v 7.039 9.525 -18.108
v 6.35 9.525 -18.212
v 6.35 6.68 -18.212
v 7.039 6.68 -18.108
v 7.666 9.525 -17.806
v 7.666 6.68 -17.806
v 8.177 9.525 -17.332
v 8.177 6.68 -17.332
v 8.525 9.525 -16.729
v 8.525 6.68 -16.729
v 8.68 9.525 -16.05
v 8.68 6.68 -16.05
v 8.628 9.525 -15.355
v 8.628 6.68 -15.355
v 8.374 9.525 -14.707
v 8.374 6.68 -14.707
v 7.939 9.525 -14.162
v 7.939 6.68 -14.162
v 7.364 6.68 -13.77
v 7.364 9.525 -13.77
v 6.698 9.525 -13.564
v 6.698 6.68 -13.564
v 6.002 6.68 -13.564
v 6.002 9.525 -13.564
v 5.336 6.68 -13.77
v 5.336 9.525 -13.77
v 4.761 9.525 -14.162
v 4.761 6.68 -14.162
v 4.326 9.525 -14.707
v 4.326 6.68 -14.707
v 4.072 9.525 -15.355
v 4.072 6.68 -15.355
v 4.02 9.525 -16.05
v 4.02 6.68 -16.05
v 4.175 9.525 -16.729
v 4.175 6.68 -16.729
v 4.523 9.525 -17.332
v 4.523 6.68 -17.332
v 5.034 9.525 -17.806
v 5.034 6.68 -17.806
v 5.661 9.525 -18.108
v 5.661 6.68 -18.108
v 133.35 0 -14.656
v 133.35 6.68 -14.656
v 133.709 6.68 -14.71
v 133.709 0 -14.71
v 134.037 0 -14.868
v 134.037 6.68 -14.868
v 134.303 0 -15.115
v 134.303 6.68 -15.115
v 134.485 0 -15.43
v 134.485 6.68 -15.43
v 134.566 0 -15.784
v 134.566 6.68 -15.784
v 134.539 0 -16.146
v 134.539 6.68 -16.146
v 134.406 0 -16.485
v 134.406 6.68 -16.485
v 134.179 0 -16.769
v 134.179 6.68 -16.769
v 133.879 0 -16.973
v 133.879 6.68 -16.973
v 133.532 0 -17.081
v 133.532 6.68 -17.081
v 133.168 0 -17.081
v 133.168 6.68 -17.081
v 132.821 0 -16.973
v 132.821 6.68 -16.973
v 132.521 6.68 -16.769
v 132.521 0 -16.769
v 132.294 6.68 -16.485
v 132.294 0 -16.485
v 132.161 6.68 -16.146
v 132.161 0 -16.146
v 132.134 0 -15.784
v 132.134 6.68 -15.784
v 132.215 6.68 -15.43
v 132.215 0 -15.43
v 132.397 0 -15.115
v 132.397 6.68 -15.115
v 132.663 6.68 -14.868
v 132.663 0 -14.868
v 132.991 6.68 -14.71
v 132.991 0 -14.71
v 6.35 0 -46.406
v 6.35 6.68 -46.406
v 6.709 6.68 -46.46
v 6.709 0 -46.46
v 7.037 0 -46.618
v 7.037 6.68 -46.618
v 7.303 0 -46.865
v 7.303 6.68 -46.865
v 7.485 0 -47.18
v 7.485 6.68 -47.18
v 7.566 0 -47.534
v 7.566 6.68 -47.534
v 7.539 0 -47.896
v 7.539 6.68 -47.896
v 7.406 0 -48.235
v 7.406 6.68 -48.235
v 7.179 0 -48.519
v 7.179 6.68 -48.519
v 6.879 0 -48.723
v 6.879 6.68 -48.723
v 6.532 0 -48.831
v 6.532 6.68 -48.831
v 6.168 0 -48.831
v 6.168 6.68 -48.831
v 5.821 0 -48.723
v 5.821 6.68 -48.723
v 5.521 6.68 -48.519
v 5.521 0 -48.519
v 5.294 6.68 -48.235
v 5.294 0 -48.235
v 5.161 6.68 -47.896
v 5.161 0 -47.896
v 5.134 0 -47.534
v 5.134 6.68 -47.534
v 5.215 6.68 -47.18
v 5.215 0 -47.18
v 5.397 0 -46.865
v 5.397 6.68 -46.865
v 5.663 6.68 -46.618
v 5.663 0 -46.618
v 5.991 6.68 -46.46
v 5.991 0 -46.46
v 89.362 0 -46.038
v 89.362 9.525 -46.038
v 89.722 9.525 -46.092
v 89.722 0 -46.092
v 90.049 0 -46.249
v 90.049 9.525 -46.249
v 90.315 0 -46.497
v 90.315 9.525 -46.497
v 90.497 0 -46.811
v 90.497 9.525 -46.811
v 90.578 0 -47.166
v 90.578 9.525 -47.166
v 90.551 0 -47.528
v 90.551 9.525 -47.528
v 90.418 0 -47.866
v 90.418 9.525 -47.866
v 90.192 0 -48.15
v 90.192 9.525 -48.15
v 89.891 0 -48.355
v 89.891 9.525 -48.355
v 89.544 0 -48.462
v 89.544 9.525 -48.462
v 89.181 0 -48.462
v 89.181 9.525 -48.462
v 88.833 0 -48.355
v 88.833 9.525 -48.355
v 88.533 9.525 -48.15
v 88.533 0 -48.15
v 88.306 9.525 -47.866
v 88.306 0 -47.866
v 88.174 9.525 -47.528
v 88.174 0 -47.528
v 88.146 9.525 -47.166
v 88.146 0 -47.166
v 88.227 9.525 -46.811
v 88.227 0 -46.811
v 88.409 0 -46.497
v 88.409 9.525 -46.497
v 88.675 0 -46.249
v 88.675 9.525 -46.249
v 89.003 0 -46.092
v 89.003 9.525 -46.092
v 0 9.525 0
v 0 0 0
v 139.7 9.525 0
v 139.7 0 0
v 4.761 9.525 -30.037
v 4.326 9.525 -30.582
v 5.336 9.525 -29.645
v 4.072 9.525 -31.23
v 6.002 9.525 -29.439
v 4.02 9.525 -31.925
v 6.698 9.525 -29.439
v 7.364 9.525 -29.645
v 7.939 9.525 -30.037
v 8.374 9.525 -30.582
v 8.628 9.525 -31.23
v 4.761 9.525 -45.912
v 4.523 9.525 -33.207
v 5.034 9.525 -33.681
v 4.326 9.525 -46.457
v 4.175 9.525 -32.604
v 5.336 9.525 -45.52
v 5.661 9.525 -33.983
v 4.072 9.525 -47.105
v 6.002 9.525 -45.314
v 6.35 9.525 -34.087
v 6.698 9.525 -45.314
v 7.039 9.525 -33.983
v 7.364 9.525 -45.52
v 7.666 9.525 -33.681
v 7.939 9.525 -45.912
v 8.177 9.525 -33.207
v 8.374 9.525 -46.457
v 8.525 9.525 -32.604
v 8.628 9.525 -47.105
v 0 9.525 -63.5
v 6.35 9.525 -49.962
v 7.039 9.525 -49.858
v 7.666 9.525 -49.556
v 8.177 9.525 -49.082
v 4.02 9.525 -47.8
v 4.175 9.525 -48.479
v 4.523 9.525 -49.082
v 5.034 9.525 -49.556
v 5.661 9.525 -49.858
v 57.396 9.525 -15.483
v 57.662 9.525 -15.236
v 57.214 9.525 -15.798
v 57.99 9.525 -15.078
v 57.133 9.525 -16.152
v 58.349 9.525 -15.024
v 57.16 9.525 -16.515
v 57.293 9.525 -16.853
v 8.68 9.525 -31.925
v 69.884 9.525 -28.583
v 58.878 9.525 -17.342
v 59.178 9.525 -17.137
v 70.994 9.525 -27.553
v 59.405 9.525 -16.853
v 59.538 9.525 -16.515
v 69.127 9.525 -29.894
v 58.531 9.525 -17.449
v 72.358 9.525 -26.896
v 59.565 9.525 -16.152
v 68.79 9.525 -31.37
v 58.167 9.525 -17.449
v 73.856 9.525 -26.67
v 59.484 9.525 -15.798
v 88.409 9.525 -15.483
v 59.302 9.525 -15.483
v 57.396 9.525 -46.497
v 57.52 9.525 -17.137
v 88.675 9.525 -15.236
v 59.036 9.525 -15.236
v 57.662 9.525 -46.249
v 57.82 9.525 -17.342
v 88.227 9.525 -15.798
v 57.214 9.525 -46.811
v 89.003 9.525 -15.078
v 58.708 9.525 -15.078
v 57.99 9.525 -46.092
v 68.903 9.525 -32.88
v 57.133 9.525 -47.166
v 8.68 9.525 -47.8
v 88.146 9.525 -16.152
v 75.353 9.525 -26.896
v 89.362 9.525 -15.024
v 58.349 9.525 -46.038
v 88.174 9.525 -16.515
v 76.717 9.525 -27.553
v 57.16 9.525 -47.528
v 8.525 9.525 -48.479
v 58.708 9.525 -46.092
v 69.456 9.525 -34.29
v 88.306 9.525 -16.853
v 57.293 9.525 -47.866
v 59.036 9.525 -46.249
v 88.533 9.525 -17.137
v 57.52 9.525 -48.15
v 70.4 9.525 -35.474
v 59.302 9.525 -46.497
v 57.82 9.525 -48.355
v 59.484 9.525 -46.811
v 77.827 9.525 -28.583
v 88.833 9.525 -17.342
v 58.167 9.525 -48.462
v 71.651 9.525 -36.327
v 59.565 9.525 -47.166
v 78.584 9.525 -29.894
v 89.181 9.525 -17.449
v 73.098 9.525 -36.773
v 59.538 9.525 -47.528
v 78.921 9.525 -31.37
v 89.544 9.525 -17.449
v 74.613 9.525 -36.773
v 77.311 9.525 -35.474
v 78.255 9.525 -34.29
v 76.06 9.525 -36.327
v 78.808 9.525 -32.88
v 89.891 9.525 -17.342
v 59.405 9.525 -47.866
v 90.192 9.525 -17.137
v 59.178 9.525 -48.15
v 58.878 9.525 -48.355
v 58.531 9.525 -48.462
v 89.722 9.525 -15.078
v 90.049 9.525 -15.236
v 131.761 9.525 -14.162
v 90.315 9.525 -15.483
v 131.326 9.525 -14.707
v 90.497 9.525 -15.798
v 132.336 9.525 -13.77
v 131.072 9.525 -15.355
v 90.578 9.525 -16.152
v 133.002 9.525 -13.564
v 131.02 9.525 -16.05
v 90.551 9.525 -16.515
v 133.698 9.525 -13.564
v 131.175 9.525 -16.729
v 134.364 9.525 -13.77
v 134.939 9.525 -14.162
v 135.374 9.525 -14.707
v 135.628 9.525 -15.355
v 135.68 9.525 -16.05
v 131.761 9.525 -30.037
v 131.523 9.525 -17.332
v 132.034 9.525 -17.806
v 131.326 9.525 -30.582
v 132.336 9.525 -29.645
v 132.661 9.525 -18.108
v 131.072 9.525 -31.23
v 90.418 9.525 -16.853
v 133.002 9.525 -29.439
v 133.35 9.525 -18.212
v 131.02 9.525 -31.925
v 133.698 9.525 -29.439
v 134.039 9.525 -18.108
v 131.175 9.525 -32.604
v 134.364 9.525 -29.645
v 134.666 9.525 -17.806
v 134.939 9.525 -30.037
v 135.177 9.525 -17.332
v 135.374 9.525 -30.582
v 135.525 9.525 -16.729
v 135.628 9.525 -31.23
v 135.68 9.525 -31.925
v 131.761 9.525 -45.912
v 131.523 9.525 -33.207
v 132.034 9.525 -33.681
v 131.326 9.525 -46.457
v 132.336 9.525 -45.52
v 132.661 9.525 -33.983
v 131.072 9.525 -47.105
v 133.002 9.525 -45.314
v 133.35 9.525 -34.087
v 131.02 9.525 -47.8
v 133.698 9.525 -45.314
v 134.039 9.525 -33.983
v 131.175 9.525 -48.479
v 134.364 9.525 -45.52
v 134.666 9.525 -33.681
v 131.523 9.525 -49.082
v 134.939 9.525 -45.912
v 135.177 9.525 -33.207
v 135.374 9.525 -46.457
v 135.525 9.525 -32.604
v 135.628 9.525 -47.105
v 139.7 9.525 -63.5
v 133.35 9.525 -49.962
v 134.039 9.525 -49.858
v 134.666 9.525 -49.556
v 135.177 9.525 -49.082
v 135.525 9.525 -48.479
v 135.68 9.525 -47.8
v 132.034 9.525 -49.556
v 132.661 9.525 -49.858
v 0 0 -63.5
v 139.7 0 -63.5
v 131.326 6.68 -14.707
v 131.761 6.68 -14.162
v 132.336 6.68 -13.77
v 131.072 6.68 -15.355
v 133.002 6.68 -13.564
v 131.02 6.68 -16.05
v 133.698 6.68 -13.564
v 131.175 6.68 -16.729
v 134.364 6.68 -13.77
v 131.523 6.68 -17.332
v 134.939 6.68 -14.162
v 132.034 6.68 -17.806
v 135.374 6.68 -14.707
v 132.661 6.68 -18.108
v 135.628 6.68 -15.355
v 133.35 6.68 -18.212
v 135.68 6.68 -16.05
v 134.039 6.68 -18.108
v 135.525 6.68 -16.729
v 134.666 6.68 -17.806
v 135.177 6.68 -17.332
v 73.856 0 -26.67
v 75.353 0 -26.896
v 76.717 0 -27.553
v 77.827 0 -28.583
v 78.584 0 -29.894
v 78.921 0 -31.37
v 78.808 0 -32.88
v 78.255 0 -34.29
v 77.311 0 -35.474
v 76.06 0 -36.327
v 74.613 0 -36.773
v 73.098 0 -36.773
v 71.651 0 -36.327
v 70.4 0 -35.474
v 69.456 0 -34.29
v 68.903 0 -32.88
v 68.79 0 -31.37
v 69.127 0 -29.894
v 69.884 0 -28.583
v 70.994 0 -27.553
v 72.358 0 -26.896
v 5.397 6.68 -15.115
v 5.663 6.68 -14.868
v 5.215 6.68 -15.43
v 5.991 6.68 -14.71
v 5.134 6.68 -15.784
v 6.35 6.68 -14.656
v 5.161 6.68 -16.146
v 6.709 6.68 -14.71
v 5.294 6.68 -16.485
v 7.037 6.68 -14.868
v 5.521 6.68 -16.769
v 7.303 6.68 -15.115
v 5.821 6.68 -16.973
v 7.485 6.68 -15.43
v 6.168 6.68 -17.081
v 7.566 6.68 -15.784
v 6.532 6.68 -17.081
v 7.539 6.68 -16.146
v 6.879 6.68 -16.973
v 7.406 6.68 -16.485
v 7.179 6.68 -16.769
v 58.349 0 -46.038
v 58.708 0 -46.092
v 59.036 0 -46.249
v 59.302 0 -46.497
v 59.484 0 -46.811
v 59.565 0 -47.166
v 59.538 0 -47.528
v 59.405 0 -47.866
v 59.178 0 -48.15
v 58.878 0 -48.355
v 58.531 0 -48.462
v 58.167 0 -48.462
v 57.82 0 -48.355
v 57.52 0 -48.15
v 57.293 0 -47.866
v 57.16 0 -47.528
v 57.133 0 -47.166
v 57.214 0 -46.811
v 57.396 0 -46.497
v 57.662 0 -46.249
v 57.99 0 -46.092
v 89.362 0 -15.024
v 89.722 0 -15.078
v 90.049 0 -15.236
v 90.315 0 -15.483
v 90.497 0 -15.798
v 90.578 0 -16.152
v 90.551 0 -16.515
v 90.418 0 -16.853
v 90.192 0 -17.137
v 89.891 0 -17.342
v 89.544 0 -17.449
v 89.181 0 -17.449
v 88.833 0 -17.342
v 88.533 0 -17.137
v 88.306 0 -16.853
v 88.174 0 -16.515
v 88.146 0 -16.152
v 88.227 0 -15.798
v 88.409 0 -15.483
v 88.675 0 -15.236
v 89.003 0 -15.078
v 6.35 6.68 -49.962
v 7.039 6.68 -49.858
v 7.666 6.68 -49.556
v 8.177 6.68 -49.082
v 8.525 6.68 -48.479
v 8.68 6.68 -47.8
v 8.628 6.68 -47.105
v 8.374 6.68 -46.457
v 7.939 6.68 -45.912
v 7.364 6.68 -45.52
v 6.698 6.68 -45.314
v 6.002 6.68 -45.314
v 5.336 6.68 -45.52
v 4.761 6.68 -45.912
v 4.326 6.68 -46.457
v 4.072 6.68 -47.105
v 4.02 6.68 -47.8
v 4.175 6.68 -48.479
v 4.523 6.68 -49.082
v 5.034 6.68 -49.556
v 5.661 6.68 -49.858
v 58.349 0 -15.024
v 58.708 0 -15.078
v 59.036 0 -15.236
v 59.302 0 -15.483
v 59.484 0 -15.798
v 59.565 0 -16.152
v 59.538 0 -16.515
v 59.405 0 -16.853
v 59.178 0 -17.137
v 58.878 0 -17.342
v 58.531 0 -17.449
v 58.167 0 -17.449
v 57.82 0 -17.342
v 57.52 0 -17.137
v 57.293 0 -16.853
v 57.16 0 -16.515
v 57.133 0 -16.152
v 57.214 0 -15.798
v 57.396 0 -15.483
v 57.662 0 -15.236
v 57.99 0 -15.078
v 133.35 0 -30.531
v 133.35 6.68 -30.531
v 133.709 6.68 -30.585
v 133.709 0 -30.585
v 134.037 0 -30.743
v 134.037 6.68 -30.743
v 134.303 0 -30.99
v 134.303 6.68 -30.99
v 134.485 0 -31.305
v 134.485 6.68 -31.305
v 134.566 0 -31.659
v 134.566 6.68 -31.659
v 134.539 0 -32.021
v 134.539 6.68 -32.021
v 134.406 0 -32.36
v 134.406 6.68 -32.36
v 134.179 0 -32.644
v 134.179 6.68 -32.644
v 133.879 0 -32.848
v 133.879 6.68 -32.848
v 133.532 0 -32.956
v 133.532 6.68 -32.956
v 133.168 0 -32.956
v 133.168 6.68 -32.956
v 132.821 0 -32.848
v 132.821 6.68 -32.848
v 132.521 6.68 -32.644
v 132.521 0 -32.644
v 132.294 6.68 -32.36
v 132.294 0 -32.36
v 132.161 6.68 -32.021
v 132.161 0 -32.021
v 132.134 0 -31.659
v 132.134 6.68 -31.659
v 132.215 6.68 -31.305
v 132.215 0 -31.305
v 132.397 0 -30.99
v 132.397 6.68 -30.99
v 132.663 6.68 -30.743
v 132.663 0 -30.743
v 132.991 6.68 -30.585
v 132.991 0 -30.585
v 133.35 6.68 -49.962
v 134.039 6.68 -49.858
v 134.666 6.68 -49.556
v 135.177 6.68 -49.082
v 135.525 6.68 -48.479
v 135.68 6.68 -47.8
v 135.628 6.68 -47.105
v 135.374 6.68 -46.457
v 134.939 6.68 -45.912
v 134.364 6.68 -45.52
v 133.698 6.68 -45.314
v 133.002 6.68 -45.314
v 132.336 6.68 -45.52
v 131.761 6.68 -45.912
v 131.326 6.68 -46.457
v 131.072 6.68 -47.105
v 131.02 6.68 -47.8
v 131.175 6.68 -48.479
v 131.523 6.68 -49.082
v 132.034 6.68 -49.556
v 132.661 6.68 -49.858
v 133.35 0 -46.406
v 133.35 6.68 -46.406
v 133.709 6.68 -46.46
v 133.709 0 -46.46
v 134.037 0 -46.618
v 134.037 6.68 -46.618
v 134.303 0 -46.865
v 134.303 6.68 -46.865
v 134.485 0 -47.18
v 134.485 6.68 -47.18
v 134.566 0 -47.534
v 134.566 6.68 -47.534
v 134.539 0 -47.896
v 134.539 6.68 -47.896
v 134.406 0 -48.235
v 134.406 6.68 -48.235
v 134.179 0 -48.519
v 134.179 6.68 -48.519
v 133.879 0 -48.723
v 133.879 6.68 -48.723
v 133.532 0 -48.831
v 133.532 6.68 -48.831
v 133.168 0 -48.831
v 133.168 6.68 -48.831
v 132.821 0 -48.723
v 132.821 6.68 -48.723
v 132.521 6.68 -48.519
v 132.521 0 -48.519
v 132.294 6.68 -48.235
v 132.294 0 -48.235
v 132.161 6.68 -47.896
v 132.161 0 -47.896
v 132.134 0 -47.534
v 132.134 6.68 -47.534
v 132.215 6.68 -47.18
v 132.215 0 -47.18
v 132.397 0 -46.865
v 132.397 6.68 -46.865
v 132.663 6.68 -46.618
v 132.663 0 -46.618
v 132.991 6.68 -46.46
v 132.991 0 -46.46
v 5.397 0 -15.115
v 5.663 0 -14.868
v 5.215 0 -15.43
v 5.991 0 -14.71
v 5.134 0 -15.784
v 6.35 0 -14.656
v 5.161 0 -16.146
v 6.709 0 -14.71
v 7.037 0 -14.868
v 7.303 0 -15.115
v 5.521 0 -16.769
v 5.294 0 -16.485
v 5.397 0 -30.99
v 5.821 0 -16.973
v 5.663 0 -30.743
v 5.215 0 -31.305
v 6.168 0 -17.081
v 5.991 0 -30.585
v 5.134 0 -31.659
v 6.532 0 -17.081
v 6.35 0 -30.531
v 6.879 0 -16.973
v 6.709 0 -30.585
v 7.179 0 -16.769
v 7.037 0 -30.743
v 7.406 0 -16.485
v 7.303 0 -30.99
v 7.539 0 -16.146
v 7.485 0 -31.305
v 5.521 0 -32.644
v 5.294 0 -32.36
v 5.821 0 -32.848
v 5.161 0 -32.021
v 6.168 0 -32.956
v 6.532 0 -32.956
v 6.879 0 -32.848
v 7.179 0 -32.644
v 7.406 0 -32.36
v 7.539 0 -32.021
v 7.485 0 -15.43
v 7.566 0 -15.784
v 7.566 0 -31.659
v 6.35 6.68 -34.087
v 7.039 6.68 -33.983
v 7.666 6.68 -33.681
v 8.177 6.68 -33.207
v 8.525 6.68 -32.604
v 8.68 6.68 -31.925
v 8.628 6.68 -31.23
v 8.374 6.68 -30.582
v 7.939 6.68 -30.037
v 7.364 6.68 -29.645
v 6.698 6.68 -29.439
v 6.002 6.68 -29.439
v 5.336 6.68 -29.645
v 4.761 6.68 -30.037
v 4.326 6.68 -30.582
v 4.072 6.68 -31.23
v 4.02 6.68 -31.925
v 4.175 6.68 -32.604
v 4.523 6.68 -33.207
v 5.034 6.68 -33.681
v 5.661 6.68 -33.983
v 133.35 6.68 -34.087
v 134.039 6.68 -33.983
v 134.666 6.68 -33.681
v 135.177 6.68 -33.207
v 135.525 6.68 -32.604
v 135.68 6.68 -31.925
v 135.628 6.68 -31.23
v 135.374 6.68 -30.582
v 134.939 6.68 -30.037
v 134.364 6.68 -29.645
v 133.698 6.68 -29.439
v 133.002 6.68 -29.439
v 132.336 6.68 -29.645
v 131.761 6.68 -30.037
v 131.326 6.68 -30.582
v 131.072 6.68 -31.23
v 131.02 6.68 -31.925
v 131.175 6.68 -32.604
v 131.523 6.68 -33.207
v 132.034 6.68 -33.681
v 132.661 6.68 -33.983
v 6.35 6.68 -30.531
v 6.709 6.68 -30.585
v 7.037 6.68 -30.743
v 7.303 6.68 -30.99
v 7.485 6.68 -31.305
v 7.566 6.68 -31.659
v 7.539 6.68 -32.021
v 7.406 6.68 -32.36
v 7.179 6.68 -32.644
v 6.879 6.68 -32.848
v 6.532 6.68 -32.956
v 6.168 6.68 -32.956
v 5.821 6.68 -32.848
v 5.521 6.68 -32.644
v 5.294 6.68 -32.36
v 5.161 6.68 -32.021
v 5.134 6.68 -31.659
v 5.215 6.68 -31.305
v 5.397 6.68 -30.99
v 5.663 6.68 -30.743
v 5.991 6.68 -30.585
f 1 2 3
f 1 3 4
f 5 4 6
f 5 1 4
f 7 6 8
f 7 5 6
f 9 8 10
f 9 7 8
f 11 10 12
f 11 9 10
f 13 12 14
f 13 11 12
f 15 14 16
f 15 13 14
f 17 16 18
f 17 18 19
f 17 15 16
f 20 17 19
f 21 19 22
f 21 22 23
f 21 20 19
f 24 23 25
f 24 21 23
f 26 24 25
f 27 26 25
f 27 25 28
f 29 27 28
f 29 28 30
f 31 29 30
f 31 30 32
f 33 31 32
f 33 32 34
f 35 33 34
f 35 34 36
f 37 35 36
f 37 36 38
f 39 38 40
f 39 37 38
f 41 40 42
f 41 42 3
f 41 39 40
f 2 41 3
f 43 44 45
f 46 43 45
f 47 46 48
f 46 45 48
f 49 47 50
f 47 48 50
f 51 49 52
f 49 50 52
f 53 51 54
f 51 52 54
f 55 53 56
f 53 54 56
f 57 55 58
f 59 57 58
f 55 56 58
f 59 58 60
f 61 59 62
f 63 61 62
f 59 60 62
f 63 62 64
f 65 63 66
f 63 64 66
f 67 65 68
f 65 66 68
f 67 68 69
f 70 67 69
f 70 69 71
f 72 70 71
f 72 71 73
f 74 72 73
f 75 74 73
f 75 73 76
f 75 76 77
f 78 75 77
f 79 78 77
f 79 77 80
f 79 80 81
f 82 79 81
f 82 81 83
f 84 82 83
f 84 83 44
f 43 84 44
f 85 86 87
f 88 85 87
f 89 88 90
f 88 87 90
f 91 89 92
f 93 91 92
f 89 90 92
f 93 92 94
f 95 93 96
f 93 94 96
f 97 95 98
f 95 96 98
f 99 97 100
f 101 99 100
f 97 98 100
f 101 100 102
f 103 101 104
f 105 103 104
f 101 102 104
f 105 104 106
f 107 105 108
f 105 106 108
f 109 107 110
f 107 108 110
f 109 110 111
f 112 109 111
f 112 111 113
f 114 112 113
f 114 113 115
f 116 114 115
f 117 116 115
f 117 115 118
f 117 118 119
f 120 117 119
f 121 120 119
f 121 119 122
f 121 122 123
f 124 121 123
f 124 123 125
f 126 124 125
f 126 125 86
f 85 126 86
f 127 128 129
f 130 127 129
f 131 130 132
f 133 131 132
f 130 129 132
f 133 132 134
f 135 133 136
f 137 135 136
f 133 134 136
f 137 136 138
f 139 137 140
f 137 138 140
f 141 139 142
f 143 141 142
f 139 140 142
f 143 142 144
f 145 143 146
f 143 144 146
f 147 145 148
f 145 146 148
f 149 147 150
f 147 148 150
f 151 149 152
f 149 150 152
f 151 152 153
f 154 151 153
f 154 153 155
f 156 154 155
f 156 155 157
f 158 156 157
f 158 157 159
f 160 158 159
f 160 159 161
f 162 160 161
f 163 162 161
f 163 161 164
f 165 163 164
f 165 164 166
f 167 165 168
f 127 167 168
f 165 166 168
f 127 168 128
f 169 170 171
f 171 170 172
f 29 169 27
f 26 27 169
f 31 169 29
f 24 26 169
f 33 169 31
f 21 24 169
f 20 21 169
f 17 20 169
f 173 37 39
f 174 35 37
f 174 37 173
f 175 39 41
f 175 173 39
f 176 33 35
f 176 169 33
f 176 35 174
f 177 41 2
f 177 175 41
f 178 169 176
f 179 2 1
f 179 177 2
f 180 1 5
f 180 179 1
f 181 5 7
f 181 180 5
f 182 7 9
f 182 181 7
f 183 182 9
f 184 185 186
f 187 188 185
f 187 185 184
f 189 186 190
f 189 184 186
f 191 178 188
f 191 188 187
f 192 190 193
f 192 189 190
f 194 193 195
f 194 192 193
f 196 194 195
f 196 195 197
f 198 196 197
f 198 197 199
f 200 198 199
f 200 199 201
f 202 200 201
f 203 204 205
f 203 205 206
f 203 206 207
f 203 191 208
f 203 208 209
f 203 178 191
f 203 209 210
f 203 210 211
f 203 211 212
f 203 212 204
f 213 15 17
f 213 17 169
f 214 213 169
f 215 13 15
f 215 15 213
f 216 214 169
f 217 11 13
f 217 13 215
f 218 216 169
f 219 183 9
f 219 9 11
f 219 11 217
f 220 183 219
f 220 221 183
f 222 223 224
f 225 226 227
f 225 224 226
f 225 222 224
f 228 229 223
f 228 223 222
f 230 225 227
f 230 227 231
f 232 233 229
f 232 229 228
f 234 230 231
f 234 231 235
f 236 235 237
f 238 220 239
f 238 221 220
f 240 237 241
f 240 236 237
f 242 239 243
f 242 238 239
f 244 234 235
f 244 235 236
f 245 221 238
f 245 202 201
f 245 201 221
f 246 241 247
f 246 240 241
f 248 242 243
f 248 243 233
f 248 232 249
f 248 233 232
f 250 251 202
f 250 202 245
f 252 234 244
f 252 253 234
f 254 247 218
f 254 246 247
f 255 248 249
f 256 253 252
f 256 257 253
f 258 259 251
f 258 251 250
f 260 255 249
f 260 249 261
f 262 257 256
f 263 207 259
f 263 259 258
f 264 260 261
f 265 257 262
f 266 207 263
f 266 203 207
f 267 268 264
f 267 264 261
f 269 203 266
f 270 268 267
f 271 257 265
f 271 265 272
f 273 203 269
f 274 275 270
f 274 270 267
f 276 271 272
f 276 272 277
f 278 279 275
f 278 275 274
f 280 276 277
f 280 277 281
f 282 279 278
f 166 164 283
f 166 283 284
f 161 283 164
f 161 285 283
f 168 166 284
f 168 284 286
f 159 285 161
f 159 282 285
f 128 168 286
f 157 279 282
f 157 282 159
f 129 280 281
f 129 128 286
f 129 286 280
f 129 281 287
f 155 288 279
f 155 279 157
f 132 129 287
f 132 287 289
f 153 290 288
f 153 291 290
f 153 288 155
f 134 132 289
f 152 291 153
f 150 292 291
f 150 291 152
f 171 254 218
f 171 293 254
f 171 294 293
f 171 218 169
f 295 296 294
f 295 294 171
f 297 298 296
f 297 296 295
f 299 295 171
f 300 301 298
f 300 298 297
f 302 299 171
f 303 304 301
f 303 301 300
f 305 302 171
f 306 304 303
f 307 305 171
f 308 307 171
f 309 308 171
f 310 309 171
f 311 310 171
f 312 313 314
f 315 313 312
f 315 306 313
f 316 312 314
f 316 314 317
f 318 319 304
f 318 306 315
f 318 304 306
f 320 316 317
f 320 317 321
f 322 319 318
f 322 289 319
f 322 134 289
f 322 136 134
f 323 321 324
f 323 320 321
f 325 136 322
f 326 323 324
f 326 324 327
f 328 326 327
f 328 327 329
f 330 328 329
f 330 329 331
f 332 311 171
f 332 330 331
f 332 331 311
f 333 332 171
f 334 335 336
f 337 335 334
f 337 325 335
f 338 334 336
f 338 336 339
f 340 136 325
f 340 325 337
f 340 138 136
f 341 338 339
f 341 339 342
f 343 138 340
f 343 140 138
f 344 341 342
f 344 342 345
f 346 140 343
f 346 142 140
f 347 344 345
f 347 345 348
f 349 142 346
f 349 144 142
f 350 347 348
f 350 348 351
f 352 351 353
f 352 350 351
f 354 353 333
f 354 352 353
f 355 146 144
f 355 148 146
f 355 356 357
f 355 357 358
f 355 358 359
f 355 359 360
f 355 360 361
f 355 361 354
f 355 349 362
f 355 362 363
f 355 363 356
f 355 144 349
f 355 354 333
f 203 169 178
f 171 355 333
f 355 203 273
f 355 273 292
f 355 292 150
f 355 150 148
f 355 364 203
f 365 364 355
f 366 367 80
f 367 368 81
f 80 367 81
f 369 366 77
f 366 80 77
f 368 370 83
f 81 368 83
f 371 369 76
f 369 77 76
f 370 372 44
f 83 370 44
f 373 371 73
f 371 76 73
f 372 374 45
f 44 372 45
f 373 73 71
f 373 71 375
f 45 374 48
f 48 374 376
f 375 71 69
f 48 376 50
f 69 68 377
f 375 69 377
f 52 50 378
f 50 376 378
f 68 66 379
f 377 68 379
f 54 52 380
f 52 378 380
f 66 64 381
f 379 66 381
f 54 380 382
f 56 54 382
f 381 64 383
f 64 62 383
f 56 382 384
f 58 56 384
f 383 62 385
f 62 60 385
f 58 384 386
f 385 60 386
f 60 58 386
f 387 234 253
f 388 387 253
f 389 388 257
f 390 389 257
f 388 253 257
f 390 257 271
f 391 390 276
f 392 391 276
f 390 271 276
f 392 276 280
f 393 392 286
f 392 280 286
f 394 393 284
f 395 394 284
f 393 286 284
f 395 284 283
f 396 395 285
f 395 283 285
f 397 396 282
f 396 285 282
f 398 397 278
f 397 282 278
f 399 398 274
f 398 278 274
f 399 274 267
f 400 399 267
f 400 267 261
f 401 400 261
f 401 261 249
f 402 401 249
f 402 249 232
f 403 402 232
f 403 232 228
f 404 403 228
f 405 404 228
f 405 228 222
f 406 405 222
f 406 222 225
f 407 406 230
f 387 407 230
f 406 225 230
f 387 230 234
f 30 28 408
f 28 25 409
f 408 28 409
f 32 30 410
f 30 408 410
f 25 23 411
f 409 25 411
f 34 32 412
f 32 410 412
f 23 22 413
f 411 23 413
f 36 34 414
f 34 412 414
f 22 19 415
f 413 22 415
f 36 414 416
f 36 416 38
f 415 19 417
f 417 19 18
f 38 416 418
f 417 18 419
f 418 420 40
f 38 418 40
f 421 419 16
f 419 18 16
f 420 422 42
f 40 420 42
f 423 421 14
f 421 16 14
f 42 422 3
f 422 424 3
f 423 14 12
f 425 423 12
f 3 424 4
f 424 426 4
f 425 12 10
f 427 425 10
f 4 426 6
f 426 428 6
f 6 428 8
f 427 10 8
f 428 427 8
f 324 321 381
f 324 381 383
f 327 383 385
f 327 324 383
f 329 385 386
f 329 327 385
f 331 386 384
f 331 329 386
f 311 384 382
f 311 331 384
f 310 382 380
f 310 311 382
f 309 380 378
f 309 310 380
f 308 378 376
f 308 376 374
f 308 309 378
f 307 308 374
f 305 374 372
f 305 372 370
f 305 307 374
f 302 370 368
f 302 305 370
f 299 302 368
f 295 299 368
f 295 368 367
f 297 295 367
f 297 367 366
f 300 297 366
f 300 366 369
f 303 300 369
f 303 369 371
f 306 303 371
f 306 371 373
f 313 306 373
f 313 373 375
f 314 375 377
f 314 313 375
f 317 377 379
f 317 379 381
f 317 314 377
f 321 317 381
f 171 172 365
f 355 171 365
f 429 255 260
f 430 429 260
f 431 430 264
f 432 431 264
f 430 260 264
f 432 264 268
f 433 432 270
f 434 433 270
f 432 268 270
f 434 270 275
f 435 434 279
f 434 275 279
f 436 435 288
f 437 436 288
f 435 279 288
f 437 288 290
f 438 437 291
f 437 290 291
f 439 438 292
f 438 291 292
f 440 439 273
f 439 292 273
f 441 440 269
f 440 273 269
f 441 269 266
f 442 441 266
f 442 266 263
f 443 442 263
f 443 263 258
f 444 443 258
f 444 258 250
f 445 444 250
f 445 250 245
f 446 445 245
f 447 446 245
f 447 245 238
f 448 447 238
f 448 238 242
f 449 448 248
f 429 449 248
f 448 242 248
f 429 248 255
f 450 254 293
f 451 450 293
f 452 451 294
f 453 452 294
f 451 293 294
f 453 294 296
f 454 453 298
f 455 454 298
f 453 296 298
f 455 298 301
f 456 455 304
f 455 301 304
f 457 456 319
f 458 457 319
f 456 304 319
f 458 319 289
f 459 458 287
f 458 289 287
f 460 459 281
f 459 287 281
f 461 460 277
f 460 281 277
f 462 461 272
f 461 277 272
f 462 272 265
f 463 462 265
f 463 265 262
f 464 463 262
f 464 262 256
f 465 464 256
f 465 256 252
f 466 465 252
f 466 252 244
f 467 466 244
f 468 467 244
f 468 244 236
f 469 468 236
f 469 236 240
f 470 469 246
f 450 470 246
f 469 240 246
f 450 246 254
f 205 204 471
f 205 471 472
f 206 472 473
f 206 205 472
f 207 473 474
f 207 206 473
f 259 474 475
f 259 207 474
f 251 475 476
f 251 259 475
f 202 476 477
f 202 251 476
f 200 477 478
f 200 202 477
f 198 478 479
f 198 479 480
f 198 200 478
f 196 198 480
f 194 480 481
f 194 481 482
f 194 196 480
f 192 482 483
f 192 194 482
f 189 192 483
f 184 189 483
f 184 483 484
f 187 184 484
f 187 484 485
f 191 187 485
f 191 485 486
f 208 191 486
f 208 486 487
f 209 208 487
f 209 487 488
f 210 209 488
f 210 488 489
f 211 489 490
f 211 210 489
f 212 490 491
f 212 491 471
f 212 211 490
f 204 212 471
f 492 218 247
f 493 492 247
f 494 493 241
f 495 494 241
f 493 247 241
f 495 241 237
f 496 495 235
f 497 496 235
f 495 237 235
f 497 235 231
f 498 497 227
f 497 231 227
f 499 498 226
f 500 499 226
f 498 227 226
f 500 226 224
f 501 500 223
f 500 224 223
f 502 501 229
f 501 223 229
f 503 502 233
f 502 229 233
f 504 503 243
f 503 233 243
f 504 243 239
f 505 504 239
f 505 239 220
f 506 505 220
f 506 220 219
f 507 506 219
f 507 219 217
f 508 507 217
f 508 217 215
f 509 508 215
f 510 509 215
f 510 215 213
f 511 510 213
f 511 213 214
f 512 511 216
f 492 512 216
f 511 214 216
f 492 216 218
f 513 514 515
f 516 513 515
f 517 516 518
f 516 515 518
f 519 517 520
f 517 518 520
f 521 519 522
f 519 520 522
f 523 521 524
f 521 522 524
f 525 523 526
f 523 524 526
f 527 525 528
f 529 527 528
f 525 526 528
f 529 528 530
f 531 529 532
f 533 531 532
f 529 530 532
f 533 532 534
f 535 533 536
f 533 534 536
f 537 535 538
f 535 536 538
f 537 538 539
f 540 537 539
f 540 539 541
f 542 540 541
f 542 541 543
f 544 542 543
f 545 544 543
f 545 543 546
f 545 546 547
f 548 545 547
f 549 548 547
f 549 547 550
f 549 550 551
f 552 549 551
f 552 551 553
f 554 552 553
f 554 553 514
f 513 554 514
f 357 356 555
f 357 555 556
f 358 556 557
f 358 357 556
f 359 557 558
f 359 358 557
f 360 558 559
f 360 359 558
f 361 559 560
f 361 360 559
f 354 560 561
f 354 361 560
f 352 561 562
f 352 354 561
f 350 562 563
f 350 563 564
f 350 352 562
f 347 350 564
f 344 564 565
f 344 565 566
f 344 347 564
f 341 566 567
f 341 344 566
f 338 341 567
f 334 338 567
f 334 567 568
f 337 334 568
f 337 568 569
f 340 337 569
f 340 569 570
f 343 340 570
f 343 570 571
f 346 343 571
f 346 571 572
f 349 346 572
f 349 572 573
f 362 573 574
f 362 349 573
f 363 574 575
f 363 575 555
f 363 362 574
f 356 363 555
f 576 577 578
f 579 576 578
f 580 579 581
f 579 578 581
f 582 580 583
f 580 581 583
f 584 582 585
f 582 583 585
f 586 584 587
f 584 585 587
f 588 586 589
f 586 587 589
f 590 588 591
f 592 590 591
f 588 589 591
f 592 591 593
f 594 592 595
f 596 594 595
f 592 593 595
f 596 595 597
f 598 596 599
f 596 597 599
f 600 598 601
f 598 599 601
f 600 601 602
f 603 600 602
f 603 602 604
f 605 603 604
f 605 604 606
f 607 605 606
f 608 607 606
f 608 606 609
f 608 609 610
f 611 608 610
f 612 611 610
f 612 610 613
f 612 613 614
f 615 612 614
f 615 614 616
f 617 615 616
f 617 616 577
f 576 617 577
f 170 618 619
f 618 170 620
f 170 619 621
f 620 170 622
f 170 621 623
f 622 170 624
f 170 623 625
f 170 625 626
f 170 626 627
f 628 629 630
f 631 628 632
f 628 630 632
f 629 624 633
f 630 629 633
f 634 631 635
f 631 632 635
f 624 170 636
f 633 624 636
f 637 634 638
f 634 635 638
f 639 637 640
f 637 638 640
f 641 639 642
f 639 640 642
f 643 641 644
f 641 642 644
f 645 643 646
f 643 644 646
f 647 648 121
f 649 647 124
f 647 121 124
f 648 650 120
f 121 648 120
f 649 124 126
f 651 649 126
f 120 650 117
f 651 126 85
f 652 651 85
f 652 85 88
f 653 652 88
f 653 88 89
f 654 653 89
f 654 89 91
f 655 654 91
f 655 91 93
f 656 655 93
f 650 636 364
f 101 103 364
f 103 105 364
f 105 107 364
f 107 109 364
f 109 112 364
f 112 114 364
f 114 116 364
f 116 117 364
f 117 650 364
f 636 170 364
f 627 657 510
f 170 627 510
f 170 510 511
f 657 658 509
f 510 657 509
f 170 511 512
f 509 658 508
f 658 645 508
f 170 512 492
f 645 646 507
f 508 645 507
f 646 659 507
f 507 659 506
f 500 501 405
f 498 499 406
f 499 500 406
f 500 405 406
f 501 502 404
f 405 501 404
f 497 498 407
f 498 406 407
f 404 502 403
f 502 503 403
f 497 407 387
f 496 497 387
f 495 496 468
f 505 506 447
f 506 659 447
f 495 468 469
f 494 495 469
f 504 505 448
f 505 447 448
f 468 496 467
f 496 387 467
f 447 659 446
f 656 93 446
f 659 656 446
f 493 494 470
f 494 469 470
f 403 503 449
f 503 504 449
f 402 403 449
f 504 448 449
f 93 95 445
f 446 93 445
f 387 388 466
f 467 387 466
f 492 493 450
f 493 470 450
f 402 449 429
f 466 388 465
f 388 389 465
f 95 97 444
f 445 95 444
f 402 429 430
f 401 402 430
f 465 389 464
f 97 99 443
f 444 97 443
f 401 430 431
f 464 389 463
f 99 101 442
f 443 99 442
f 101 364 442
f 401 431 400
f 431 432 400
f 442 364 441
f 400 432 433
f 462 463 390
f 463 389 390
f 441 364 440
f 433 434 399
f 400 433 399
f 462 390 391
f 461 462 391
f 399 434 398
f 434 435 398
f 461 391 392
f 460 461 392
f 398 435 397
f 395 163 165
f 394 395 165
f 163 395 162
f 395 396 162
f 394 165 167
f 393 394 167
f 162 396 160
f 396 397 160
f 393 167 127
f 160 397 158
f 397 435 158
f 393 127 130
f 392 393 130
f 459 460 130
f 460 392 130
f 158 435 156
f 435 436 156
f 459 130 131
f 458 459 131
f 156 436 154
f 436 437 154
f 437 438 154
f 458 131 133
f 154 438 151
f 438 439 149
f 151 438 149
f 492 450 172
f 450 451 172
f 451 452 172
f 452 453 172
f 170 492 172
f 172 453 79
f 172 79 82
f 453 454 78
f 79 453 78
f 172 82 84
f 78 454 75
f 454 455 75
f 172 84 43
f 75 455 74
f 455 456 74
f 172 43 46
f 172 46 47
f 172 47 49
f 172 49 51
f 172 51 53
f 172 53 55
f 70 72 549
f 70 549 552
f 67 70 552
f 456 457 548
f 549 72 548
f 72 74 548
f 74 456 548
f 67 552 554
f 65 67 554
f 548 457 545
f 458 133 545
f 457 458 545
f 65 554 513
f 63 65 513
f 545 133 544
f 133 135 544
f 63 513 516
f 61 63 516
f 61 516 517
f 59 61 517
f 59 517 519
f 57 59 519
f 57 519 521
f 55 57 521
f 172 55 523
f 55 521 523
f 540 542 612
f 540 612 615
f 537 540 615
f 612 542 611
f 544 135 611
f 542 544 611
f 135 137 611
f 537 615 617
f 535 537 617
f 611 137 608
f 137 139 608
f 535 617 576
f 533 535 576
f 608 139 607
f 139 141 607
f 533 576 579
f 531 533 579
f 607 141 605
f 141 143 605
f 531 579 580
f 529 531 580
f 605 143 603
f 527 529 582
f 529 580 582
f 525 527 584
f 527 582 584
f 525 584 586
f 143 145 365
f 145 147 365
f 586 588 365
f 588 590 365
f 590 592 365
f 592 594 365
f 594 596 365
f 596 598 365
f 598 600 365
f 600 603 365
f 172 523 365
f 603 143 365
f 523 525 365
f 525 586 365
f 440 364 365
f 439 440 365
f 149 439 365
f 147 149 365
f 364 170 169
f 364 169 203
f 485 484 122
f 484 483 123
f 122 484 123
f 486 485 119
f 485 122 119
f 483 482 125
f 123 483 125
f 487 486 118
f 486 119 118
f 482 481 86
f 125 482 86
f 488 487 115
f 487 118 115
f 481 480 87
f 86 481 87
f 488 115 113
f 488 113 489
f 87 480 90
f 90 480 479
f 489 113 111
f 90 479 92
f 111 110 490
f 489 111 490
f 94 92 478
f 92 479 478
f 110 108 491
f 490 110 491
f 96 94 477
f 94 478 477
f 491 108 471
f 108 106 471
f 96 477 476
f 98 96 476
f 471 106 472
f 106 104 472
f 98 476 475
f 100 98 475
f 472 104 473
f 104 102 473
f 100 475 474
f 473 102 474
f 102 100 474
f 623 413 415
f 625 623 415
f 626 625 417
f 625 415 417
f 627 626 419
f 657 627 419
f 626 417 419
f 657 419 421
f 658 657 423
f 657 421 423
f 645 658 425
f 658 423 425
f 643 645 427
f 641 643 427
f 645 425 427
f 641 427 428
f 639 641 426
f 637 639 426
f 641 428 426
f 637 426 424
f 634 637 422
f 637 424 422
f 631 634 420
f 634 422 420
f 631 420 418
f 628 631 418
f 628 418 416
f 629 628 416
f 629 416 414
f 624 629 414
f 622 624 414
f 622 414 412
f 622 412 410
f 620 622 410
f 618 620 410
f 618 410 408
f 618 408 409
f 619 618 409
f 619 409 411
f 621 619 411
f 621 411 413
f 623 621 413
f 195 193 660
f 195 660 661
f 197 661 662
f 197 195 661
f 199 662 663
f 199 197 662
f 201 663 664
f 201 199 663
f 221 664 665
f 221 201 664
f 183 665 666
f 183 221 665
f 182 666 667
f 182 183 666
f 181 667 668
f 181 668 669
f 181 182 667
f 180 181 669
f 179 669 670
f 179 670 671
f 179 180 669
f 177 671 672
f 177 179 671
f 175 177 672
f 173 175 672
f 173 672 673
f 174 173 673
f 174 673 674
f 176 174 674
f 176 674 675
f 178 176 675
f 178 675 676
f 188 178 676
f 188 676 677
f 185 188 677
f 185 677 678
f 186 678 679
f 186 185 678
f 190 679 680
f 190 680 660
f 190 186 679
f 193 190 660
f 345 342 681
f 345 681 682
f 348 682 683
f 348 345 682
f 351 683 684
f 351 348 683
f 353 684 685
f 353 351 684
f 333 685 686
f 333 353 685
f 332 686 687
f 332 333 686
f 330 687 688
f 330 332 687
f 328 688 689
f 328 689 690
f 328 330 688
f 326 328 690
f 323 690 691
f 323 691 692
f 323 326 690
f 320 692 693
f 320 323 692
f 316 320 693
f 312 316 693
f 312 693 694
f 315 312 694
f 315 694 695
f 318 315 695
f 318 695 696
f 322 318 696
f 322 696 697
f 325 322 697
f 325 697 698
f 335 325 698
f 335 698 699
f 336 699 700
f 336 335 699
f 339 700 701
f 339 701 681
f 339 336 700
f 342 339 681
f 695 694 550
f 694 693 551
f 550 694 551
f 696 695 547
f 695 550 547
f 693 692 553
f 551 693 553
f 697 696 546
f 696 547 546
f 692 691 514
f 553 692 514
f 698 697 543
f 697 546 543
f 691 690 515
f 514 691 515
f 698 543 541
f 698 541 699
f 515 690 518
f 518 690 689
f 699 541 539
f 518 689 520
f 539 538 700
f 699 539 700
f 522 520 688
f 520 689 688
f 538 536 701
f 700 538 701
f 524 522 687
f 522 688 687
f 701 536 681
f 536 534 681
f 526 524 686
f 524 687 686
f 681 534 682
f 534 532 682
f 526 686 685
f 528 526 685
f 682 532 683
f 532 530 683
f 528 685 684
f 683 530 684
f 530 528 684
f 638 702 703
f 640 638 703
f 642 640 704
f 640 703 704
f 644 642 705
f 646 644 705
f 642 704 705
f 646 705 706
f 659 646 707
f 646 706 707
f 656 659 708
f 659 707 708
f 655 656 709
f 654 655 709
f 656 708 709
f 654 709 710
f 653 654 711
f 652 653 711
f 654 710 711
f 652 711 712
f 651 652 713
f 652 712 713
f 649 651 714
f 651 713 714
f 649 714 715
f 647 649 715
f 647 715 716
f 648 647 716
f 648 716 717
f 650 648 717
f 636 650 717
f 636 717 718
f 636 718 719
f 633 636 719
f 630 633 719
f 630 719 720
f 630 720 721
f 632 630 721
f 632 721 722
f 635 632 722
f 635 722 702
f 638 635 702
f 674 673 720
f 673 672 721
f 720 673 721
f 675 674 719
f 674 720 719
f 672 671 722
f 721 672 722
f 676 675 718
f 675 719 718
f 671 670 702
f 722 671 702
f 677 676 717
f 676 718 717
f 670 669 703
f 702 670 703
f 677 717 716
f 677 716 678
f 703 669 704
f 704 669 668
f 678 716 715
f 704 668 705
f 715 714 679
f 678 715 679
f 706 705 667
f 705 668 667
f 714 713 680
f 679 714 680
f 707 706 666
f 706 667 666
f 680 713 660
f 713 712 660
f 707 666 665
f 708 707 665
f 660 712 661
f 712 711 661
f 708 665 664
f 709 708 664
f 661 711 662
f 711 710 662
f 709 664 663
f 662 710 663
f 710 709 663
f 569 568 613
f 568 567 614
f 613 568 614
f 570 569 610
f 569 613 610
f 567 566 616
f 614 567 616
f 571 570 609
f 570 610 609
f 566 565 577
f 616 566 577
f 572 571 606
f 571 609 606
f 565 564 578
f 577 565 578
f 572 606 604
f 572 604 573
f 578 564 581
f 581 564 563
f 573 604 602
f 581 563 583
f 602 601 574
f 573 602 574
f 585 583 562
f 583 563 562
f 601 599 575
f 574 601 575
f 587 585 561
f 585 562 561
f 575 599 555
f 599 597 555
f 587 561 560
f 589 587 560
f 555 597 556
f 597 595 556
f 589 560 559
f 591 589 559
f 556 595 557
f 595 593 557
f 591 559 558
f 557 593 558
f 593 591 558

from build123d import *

# Parameters (mm, degrees)
SKETCH1_W           = 139.7
SKETCH1_H           = 63.5
BOSS_EXTRUDE1_DEPTH = 9.525
SKETCH2_R           = 1.2192
SKETCH2_R_2         = 5.08
CUT_EXTRUDE1_DEPTH  = 9.525
SKETCH3_R           = 2.3368
CUT_EXTRUDE3_DEPTH  = 2.8448
SKETCH4_R           = 1.2192
CUT_EXTRUDE5_DEPTH  = 154.750010163


with BuildPart() as part:
    # Sketch1 → Boss-Extrude1 (new body)
    with BuildSketch(Plane(origin=(0, 0, 0), x_dir=(1, 0, 0), z_dir=(0, 1, 0))):
        with Locations((69.85, 31.75)):
            Rectangle(SKETCH1_W, SKETCH1_H)
    extrude(amount=BOSS_EXTRUDE1_DEPTH)

    # Sketch2 → Cut-Extrude1 (cut)
    with BuildSketch(Plane(origin=(0, 9.525, 0), x_dir=(1, 0, 0), z_dir=(0, 1, 0))):
        with Locations(Location((58.34888, 47.2567, 0), (0, 0, 270))):
            Circle(SKETCH2_R)
        with Locations(Location((89.36228, 47.2567, 0), (0, 0, 270))):
            Circle(SKETCH2_R)
        with Locations(Location((89.36228, 16.2433, 0), (0, 0, 270))):
            Circle(SKETCH2_R)
        with Locations(Location((58.34888, 16.2433, 0), (0, 0, 270))):
            Circle(SKETCH2_R)
        with Locations(Location((73.85558, 31.75, 0), (0, 0, 270))):
            Circle(SKETCH2_R_2)
    extrude(amount=-CUT_EXTRUDE1_DEPTH, mode=Mode.SUBTRACT)

    # Sketch3 → Cut-Extrude3 (cut)
    with BuildSketch(Plane.XZ.offset(-9.525)):
        with Locations(Location((6.35, -15.875, 0), (0, 0, 270))):
            Circle(SKETCH3_R)
        with Locations(Location((6.35, -31.75, 0), (0, 0, 270))):
            Circle(SKETCH3_R)
        with Locations(Location((6.35, -47.625, 0), (0, 0, 270))):
            Circle(SKETCH3_R)
        with Locations(Location((133.35, -47.625, 0), (0, 0, 270))):
            Circle(SKETCH3_R)
        with Locations(Location((133.35, -31.75, 0), (0, 0, 270))):
            Circle(SKETCH3_R)
        with Locations(Location((133.35, -15.875, 0), (0, 0, 270))):
            Circle(SKETCH3_R)
    extrude(amount=CUT_EXTRUDE3_DEPTH, mode=Mode.SUBTRACT)

    # Sketch4 → Cut-Extrude5 (cut, through all)
    with BuildSketch(Plane(origin=(0, 9.525, 0), x_dir=(1, 0, 0), z_dir=(0, 1, 0))):
        with Locations(Location((6.35, 47.625, 0), (0, 0, 270))):
            Circle(SKETCH4_R)
        with Locations(Location((6.35, 31.75, 0), (0, 0, 270))):
            Circle(SKETCH4_R)
        with Locations(Location((6.35, 15.875, 0), (0, 0, 270))):
            Circle(SKETCH4_R)
        with Locations(Location((133.35, 15.875, 0), (0, 0, 270))):
            Circle(SKETCH4_R)
        with Locations(Location((133.35, 31.75, 0), (0, 0, 270))):
            Circle(SKETCH4_R)
        with Locations(Location((133.35, 47.625, 0), (0, 0, 270))):
            Circle(SKETCH4_R)
    extrude(amount=-CUT_EXTRUDE5_DEPTH, mode=Mode.SUBTRACT)


solid = part.part
